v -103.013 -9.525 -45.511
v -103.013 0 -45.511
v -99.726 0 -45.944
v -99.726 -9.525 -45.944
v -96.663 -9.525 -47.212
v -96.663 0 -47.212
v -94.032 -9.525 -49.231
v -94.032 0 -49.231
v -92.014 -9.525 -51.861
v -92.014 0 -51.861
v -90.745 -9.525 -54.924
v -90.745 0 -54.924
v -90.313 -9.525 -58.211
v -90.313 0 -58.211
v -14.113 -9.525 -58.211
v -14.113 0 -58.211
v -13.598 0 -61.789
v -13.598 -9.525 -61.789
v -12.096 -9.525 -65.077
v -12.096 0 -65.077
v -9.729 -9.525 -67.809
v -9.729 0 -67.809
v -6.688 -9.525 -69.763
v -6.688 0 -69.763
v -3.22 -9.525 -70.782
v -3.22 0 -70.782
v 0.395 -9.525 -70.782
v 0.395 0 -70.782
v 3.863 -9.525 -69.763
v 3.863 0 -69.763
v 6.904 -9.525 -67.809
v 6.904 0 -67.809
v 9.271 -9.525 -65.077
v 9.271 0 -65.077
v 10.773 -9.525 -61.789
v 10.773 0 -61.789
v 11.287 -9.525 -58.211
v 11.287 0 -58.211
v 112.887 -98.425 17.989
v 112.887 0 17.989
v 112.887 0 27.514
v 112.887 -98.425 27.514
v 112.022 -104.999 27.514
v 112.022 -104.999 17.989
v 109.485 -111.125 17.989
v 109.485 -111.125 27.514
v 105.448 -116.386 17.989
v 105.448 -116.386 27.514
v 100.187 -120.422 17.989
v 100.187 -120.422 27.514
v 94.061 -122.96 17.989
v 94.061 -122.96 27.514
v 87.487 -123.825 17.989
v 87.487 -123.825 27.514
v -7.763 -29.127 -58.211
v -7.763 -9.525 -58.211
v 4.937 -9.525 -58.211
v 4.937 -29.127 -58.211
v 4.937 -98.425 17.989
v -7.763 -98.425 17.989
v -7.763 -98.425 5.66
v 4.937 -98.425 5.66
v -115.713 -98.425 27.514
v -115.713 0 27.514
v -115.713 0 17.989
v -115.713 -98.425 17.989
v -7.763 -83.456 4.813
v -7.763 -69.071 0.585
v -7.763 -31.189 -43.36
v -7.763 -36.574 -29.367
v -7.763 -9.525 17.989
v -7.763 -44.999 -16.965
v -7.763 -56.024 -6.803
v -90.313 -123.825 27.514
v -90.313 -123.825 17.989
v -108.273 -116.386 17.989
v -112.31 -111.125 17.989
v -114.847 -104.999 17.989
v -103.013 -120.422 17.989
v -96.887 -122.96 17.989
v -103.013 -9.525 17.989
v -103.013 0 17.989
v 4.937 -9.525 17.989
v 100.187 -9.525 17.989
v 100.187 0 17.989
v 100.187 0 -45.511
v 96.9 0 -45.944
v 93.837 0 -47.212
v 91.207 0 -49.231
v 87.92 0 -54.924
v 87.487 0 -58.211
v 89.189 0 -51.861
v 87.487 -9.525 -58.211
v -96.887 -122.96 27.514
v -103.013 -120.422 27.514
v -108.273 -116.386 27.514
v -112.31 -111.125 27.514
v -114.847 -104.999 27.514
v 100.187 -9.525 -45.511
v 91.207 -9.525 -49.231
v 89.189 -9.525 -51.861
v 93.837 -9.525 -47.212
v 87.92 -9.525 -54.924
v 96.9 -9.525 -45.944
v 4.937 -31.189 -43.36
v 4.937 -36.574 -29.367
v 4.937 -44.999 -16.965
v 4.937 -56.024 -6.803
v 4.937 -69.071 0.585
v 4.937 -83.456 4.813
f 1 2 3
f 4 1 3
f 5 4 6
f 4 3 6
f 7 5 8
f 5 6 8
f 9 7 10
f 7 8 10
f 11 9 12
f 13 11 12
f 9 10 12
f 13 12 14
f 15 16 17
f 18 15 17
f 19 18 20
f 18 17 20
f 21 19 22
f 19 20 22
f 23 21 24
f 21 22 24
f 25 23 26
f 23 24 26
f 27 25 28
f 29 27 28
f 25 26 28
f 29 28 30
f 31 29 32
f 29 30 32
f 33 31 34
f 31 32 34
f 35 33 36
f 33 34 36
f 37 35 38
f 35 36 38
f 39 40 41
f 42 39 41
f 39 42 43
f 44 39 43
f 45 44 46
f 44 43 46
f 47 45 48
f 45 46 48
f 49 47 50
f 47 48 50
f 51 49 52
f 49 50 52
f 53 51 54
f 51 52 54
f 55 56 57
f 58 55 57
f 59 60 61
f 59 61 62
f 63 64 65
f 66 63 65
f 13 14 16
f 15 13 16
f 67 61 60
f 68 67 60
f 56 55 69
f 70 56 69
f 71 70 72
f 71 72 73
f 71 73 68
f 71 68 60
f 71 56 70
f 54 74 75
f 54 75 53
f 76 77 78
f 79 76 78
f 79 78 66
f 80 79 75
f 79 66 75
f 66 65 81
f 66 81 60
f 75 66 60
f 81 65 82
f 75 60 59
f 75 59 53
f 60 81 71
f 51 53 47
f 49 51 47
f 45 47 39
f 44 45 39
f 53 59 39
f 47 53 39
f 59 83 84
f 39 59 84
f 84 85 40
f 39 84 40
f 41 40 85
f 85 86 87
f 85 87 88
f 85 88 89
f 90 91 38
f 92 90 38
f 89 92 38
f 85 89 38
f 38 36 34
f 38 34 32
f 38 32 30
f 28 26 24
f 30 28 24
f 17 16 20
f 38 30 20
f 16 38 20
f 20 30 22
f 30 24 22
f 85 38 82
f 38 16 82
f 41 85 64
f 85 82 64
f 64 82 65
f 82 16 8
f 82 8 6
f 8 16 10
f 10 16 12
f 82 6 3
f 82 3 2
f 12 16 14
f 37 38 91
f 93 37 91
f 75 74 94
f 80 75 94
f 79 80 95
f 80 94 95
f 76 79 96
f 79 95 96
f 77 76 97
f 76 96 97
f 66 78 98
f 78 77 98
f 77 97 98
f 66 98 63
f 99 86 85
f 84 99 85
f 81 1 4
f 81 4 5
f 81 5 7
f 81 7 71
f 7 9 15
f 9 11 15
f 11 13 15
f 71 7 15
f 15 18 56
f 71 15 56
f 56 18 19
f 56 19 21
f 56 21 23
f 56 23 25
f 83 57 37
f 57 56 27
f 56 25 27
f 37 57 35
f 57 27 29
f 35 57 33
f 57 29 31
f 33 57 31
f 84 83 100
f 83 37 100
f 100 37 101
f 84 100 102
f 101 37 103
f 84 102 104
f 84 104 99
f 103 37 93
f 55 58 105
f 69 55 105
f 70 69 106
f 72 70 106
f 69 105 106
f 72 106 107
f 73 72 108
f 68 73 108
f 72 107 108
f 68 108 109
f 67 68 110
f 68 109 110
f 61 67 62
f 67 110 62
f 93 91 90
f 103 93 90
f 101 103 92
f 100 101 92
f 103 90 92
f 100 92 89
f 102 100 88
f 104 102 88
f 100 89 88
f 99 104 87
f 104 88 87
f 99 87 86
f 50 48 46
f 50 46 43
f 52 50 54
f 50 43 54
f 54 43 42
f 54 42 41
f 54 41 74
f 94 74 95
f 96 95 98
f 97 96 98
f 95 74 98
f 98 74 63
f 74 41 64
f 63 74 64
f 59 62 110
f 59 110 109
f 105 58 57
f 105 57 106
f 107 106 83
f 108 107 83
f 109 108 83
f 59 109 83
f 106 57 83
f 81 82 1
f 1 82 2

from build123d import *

# Parameters (mm, degrees)
F1_DEPTH  = 9.525
F2_W      = 12.7
F2_H      = 9.525
F2_W_2    = 203.2
F3_DEPTH  = 9.525
F5_DEPTH  = 114.3
F7_DEPTH  = 9.652
F8_DEPTH  = 25.4
F9_W      = 12.7
F9_H      = 76.2
F10_DEPTH = 88.9
F12_DEPTH = 25.4


with BuildPart() as f1:
    # F0 (on Front) → F1 (new body)
    with BuildSketch(Plane.XZ):
        with BuildLine():
            Line((100.1874667764, 17.9892315423), (-103.0125332236, 17.9892315423))
            Line((-103.0125332236, 17.9892315423), (-103.0125332236, -45.5107684577))
            ThreePointArc((-103.0125332236, -45.5107684577), (-94.0322771026, -49.2305123366), (-90.3125332236, -58.2107684577))
            Line((-90.3125332236, -58.2107684577), (-14.1125332236, -58.2107684577))
            ThreePointArc((-14.1125332236, -58.2107684577), (-1.4125332236, -70.9107684577), (11.2874667764, -58.2107684577))
            Line((11.2874667764, -58.2107684577), (87.4874667764, -58.2107684577))
            ThreePointArc((87.4874667764, -58.2107684577), (91.2072106553, -49.2305123366), (100.1874667764, -45.5107684577))
            Line((100.1874667764, -45.5107684577), (100.1874667764, 17.9892315423))
        make_face()
    extrude(amount=F1_DEPTH)

    # F2 (on face) → F3 (join)
    with BuildSketch(Plane.XY.offset(17.9892315423)):
        with Locations((-109.3625332236, -4.7625)):
            Rectangle(F2_W, F2_H)
        with Locations((-1.4125332236, -4.7625)):
            Rectangle(F2_W_2, F2_H)
        with Locations((106.5374667764, -4.7625)):
            Rectangle(F2_W, F2_H)
    extrude(amount=F3_DEPTH)

    # F4 (on face) → F5 (join)
    with BuildSketch(Plane.XZ.offset(9.525)):
        Polygon((-115.7125332236, 17.9892315423), (-103.0125332236, 17.9892315423), (100.1874667764, 17.9892315423), (112.8874667764, 17.9892315423), (112.8874667764, 27.5142315423), (-115.7125332236, 27.5142315423), align=None)
    extrude(amount=F5_DEPTH)

    # F6 (on face) → F7 (cut)
    with BuildSketch(Plane.XY.offset(27.5142315423)):
        with BuildLine():
            ThreePointArc((-90.3125332236, -123.825), (-108.2730454658, -116.3855122421), (-115.7125332236, -98.425))
            Line((-115.7125332236, -98.425), (-115.7125332236, -123.825))
            Line((-115.7125332236, -123.825), (-90.3125332236, -123.825))
        make_face()
    extrude(amount=-F7_DEPTH, mode=Mode.SUBTRACT)

    # F6 (on face) → F8 (cut)
    with BuildSketch(Plane.XY.offset(27.5142315423)):
        with BuildLine():
            Line((112.8874667764, -123.825), (112.8874667764, -98.425))
            ThreePointArc((112.8874667764, -98.425), (105.4479790185, -116.3855122421), (87.4874667764, -123.825))
            Line((87.4874667764, -123.825), (112.8874667764, -123.825))
        make_face()
    extrude(amount=-F8_DEPTH, mode=Mode.SUBTRACT)

    # F9 (on face) → F10 (join)
    with BuildSketch(Plane.XZ.offset(9.525)):
        with Locations((-1.4125332236, -20.1107684577)):
            Rectangle(F9_W, F9_H)
    extrude(amount=F10_DEPTH)

    # F11 (on face) → F12 (cut)
    with BuildSketch(Plane.YZ.offset(4.9374667764)):
        with BuildLine():
            ThreePointArc((-29.1272475292, -58.2107684577), (-50.2201883101, -11.5676739355), (-98.425, 5.659820001))
            Line((-98.425, 5.659820001), (-98.425, 5.2892315423))
            Line((-98.425, 5.2892315423), (-98.425, -58.2107684577))
            Line((-98.425, -58.2107684577), (-29.1272475292, -58.2107684577))
        make_face()
    extrude(amount=-F12_DEPTH, mode=Mode.SUBTRACT)


solid = f1.part
